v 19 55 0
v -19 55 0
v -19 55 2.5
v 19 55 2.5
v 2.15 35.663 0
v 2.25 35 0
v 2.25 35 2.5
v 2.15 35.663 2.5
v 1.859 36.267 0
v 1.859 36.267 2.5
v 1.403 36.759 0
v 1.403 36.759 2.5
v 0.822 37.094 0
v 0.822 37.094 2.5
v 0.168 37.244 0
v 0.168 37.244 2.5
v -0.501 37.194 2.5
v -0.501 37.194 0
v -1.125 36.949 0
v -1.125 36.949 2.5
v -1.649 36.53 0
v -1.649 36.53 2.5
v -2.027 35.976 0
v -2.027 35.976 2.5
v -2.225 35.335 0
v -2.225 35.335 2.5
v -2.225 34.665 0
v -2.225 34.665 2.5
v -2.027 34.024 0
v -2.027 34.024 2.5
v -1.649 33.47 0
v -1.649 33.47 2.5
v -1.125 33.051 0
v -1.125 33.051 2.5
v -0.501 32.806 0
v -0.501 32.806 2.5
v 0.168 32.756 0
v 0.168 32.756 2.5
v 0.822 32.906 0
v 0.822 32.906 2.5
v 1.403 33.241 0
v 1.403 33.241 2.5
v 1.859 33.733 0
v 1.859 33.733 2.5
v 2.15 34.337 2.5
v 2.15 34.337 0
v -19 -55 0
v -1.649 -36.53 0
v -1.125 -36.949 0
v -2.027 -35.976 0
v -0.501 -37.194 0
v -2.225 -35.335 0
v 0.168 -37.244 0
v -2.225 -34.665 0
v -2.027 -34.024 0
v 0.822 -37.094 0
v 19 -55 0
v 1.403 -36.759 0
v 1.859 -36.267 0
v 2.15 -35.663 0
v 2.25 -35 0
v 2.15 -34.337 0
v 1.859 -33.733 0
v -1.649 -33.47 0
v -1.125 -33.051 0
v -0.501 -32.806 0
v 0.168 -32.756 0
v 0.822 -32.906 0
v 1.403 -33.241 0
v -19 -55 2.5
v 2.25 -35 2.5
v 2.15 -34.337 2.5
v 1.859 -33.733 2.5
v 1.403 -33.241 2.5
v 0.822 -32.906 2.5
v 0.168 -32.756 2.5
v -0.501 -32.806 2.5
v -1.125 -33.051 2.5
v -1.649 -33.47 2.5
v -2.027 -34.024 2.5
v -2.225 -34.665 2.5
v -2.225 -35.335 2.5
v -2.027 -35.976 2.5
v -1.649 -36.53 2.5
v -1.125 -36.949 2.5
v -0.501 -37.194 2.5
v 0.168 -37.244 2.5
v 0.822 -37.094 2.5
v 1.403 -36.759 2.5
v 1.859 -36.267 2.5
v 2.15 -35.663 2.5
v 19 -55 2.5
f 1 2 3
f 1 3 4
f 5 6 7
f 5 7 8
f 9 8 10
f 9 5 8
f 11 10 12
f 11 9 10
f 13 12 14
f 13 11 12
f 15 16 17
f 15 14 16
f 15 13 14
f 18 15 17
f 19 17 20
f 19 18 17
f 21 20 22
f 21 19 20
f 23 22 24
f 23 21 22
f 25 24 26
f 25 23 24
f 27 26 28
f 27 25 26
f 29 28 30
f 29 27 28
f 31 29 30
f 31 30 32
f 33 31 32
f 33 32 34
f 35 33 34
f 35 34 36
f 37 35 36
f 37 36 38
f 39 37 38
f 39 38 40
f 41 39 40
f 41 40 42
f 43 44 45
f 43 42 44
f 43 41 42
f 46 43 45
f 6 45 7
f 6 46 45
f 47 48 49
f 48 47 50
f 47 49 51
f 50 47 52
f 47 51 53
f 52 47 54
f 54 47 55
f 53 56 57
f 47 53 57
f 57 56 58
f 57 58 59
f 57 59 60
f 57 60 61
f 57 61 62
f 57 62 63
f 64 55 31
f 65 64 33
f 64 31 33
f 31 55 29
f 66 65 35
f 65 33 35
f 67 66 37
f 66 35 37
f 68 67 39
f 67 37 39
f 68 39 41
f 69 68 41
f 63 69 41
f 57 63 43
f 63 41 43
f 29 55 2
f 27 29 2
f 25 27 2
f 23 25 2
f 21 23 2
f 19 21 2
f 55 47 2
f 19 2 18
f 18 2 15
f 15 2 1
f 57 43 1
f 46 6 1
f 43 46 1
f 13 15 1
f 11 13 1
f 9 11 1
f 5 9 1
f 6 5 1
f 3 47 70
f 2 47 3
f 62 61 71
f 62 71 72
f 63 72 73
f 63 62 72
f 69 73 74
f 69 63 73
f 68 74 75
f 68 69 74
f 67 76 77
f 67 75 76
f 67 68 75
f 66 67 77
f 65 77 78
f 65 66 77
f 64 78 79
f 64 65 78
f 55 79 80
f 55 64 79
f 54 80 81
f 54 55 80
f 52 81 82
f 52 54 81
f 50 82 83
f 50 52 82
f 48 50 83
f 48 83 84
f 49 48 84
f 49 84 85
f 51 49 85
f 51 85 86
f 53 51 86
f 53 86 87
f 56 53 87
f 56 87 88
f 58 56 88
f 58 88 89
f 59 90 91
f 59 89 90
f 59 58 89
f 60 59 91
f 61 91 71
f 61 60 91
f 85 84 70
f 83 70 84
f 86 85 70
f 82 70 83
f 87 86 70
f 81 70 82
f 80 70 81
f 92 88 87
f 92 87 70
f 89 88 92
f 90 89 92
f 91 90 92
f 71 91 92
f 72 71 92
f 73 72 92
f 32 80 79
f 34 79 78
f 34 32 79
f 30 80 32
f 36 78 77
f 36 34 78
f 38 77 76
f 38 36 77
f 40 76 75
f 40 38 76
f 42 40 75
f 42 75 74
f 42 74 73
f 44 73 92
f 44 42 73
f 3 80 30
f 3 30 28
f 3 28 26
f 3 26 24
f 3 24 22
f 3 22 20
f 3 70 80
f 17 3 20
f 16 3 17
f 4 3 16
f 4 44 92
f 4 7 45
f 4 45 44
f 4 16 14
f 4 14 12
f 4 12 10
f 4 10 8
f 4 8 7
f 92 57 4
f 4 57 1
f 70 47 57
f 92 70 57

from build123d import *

# Parameters (mm, degrees)
SKETCH1_W               = 38
SKETCH1_H               = 110
BOSS_EXTRUDE1_DEPTH     = 2.5
CUT_EXTRUDE1_DEPTH      = 59.243025334
CUT_EXTRUDE1_DEPTH_BACK = 59.243025334
SKETCH2_R               = 2.25


with BuildPart() as part:
    # Sketch1 → Boss-Extrude1 (new body)
    with BuildSketch(Plane.XY):
        Rectangle(SKETCH1_W, SKETCH1_H)
    extrude(amount=BOSS_EXTRUDE1_DEPTH)

    # Sketch2 → Cut-Extrude1 (cut, two sides: drawn at the far end of the back side and taken through both)
    with BuildSketch(Plane.XY.offset(2.5).offset(-CUT_EXTRUDE1_DEPTH_BACK)):
        with Locations((0, 35)):
            Circle(SKETCH2_R)
        with Locations((0, -35)):
            Circle(SKETCH2_R)
    extrude(amount=CUT_EXTRUDE1_DEPTH + CUT_EXTRUDE1_DEPTH_BACK, mode=Mode.SUBTRACT)


solid = part.part
